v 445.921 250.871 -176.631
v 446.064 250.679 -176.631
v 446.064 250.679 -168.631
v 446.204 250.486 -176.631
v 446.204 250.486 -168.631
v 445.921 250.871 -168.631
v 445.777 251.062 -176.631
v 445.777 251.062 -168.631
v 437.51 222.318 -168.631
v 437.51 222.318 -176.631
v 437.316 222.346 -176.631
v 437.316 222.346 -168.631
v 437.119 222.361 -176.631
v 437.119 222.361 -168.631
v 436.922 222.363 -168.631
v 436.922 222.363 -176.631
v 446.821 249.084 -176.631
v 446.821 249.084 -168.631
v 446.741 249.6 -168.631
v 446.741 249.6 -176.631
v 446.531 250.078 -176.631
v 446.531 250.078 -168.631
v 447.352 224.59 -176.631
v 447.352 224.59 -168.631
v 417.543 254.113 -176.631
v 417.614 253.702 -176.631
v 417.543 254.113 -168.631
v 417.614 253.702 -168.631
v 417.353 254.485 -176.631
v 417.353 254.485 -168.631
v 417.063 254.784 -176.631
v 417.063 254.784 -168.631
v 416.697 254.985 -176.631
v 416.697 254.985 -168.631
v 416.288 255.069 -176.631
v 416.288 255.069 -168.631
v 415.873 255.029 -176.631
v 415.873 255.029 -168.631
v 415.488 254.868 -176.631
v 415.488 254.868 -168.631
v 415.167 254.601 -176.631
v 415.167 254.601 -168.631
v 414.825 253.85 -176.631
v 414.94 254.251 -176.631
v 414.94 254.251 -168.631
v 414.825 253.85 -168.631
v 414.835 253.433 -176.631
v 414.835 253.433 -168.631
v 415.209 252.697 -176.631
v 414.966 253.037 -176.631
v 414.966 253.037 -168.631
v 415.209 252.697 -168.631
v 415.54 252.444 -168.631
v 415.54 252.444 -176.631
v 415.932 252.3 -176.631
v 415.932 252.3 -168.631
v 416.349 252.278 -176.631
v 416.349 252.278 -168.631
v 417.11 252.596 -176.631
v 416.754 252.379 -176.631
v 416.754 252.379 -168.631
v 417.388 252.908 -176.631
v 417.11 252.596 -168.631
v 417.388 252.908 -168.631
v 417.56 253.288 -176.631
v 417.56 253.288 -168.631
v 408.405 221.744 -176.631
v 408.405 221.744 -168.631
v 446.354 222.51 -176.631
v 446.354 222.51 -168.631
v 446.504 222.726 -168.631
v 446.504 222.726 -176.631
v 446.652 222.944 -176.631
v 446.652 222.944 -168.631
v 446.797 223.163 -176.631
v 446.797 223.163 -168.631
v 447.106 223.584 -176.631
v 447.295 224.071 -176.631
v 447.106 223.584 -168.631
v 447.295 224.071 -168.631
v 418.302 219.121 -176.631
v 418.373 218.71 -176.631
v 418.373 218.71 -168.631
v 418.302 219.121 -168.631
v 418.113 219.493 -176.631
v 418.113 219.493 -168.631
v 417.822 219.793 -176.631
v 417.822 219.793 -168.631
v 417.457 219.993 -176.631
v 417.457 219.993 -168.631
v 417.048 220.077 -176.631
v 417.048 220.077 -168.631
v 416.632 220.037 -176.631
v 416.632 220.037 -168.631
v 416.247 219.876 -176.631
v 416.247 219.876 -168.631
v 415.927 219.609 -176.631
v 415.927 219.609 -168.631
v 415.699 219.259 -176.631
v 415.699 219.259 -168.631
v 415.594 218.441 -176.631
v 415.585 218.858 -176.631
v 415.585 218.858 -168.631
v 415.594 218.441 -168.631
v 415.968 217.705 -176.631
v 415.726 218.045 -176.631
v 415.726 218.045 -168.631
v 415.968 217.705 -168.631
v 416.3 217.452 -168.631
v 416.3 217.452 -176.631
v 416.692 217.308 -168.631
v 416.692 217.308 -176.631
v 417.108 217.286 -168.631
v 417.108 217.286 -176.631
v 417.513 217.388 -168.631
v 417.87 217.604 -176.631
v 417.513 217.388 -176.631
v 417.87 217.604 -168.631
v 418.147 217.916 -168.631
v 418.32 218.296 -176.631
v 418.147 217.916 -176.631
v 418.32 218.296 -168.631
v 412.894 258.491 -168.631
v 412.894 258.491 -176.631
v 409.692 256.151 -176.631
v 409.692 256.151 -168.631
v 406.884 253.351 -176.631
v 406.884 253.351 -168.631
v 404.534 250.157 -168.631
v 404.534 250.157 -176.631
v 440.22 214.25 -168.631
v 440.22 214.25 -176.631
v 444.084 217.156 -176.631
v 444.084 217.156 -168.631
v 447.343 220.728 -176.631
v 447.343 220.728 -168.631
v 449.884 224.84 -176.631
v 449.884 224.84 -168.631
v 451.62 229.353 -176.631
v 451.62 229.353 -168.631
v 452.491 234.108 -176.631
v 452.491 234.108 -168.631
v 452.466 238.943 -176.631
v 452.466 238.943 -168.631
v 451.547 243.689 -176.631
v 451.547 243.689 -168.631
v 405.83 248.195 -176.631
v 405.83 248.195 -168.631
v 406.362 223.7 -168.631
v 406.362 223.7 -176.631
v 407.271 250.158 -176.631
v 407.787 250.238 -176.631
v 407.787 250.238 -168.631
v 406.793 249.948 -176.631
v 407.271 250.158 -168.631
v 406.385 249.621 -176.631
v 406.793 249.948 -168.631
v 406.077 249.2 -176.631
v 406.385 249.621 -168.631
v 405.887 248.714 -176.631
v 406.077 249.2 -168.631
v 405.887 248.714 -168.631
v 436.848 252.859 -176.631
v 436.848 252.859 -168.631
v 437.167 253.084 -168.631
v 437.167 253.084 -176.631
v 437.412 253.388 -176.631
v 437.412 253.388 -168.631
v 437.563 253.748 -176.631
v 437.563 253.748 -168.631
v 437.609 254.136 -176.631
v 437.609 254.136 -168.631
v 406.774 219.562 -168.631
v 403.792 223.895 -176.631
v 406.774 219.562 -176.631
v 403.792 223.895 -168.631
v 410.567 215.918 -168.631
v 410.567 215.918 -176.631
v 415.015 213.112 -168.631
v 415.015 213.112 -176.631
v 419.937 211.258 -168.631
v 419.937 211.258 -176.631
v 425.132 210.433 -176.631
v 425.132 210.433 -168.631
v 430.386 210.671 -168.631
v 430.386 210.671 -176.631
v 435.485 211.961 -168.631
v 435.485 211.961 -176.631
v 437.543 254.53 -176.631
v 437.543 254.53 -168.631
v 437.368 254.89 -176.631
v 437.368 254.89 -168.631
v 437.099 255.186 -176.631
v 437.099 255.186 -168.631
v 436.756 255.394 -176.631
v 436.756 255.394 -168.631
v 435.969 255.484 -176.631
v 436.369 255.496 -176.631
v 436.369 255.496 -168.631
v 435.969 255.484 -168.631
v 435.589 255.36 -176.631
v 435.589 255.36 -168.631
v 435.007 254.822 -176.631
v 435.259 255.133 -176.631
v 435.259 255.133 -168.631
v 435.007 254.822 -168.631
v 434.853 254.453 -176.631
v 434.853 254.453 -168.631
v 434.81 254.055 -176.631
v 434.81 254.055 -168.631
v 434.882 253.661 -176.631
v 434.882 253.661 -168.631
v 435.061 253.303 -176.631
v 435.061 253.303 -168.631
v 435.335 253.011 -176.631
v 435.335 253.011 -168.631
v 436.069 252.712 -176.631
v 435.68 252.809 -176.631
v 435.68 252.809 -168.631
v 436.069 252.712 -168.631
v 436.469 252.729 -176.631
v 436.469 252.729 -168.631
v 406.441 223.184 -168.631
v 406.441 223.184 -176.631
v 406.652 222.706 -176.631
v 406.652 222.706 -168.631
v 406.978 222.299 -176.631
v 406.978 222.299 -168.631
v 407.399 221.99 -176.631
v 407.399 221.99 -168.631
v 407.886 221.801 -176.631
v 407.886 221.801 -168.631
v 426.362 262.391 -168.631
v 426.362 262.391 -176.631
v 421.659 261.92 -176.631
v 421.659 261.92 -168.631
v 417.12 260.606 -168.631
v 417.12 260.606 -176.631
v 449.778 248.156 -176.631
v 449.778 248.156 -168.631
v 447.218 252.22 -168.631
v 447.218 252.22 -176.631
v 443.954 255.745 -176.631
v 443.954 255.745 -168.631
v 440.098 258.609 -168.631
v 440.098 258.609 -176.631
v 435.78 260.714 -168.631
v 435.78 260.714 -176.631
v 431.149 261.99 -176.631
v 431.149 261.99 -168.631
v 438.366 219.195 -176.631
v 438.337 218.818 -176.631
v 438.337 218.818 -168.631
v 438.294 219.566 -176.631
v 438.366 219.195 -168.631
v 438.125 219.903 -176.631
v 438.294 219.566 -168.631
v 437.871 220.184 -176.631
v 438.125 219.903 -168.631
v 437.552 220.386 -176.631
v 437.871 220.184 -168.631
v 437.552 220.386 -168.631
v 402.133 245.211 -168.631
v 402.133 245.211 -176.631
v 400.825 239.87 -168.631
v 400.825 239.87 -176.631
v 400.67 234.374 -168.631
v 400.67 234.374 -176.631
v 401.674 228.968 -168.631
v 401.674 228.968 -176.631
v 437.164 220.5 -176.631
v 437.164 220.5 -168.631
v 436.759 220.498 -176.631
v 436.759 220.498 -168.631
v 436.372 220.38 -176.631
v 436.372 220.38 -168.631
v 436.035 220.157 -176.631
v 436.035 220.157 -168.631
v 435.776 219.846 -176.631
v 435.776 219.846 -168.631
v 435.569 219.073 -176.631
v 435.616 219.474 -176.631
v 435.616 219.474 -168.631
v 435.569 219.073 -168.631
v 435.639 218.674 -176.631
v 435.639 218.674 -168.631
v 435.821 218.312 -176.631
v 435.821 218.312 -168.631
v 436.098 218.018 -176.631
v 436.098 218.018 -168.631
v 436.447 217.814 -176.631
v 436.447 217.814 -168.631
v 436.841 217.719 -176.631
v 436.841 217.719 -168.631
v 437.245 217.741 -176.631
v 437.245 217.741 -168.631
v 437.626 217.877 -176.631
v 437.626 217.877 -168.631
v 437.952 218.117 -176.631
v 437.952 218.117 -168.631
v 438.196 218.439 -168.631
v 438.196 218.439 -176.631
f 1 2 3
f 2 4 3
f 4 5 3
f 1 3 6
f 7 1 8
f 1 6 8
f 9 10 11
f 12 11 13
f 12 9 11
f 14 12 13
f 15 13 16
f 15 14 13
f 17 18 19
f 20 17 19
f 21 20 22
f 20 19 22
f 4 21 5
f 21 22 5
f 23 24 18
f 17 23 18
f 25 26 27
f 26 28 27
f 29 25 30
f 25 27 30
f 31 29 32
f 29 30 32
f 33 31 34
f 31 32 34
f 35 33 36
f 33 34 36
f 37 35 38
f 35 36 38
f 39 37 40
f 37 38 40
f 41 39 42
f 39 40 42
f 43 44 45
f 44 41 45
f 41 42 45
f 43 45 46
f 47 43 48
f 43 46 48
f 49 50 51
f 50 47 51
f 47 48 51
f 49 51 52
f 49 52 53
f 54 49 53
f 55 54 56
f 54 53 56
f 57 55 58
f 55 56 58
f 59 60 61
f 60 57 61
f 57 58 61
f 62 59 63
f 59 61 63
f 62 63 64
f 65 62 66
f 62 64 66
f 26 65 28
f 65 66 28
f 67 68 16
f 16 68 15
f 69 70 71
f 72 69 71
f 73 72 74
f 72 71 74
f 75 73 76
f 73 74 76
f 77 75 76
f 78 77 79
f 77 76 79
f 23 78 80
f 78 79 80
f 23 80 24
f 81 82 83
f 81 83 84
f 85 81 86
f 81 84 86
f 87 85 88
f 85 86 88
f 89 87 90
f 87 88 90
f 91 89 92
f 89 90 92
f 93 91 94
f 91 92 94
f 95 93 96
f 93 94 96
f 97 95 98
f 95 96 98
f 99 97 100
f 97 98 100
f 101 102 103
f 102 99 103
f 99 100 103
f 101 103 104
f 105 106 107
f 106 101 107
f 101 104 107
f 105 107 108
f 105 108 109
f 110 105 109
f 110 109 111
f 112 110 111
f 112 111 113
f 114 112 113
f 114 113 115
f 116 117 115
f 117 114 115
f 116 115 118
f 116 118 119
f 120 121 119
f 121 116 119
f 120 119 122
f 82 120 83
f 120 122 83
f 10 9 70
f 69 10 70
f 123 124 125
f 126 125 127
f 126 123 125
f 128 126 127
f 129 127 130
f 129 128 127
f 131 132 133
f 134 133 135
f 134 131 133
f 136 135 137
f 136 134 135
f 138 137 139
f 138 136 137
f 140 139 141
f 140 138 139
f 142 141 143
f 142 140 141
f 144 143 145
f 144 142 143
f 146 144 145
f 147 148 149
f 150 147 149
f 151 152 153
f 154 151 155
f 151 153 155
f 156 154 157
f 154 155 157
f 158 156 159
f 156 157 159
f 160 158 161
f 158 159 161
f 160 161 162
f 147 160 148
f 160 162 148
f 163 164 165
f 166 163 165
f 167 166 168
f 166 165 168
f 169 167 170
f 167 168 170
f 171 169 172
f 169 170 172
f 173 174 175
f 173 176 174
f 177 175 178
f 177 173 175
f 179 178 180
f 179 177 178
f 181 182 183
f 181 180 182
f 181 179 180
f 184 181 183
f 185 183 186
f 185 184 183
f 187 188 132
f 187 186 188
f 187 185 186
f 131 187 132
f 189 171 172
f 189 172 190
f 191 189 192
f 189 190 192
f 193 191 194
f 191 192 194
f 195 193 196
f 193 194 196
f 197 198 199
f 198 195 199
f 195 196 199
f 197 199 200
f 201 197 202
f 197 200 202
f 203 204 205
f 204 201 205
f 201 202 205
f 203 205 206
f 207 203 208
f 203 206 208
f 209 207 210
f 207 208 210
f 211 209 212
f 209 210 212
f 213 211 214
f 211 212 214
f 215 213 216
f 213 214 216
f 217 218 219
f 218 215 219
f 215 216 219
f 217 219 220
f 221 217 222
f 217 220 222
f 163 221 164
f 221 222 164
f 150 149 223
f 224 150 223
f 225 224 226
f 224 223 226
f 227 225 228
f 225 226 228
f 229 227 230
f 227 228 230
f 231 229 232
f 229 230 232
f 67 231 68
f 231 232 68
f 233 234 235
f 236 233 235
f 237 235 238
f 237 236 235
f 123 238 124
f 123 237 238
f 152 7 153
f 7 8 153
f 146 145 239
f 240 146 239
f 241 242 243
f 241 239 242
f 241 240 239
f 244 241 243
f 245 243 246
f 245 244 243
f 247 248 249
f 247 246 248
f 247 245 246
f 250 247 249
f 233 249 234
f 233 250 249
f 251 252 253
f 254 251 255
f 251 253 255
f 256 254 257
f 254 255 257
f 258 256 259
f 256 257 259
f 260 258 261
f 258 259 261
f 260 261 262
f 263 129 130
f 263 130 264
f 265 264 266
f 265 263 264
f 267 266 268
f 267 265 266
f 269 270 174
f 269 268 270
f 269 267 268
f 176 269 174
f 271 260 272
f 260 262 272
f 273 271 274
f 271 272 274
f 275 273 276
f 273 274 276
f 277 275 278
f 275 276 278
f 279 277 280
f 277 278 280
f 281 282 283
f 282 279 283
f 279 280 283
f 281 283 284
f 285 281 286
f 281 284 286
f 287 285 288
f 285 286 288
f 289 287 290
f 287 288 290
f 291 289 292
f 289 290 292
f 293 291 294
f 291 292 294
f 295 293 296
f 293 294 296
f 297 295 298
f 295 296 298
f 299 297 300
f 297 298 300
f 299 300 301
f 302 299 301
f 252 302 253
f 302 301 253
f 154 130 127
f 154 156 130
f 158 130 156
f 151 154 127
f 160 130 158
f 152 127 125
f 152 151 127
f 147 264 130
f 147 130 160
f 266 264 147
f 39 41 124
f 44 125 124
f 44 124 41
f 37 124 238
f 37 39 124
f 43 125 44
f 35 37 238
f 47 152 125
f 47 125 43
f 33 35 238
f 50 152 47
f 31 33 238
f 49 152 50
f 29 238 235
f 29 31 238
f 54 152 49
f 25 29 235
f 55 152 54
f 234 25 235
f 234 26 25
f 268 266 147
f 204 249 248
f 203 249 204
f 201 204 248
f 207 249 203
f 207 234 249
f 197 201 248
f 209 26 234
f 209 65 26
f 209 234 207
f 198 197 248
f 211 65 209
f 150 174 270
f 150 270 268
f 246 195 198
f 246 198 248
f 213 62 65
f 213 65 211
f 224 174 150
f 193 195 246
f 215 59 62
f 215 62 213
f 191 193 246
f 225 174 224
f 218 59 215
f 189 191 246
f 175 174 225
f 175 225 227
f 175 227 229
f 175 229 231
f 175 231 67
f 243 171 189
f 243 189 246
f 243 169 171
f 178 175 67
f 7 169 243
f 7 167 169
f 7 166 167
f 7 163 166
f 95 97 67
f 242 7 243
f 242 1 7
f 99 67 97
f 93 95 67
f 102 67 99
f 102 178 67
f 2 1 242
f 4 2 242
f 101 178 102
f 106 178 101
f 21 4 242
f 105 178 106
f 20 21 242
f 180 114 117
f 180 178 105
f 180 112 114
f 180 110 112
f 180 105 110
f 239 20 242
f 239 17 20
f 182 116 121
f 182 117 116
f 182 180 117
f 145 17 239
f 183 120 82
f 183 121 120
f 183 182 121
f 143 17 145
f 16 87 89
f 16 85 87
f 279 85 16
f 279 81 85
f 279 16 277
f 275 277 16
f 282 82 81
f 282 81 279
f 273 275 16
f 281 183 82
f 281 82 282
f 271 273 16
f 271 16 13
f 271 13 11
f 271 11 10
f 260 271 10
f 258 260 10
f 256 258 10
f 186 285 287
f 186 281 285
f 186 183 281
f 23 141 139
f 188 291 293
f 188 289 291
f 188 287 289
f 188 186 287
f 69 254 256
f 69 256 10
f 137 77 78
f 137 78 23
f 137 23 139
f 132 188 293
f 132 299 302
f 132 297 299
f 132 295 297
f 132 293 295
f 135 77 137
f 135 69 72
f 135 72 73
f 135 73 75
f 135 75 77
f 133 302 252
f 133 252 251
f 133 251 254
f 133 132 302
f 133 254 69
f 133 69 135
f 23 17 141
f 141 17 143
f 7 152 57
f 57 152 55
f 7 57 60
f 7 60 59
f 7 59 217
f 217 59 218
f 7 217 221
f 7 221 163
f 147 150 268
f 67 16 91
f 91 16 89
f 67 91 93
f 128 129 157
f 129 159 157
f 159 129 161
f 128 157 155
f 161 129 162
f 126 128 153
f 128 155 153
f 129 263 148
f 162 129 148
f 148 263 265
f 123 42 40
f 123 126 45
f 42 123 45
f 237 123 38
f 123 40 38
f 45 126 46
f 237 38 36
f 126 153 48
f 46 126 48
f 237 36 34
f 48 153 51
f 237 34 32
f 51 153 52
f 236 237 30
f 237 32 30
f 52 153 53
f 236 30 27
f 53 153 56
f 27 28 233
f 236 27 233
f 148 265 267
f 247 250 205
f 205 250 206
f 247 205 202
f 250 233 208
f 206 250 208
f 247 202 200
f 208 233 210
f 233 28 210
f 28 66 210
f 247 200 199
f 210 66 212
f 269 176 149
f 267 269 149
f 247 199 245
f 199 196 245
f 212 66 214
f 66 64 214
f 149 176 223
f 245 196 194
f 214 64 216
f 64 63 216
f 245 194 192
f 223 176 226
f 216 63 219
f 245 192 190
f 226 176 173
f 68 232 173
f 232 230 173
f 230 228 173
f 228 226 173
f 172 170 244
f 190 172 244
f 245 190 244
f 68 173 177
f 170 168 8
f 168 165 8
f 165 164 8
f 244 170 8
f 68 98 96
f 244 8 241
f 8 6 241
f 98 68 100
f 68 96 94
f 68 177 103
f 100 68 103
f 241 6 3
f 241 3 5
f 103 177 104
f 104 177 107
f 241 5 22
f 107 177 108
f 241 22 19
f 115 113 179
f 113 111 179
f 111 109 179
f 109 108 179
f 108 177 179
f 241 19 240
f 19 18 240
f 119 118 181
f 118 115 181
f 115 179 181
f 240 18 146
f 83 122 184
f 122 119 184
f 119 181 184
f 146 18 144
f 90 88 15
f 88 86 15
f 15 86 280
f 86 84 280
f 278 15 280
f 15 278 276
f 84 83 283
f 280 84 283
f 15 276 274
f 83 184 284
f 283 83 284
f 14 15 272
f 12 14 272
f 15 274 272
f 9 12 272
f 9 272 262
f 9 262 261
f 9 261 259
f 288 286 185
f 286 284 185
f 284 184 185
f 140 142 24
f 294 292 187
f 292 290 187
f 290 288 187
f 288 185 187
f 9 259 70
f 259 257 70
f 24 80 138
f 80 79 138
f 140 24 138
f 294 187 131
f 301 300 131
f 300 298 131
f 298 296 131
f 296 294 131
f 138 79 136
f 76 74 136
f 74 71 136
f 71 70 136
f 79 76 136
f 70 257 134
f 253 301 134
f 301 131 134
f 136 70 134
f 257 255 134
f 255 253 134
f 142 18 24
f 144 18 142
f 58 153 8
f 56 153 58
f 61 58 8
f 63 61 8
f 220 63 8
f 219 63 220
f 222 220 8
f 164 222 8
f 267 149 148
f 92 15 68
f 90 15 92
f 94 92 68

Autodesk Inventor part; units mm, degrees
ref_plane "YZ Plane" through (0, 0, 0) normal (1, 0, 0) x (0, 1, 0)
ref_plane "XZ Plane" through (0, 0, 0) normal (0, 1, 0) x (-1, 0, 0)
ref_plane "XY Plane" through (0, 0, 0) normal (0, 0, 1) x (1, 0, 0)
ref_plane "Arbeitsebene1" through (426.5914, 236.3923, -168.6308) normal (0, 0, -1) x (0.9998, 0.0217, 0)
sketch "Skizze1" plane through (426.5914, 236.3923, -168.6308) normal (0, 0, -1) x (0.9998, 0.0217, 0)
  circle A0 centre (-10, -17.5) radius 1.4 projected
  arc A1 (-22.2323, -12) -> (-21.7536, -14.2401) centre (-19.0971, -12.5012) ccw projected
  arc A2 (-21.7536, -14.2401) -> (-13.215, -22.3912) centre (0, 0) ccw projected
  arc A3 (-13.215, -22.3912) -> (-8.8966, -21.32) centre (-11.6012, -19.6569) ccw projected
  arc A4 (-2.8797, -22.9216) -> (-8.8966, -21.32) centre (-6.1282, -23.0224) ccw projected
  arc A5 (-2.8797, -22.9216) -> (0.3346, -25.9978) centre (0.2937, -22.8231) ccw projected
  arc A6 (0.3346, -25.9978) -> (25.1076, -6.7536) centre (0, 0) ccw projected
  arc A7 (25.1076, -6.7536) -> (24.1419, -5.4938) centre (24.1419, -6.4938) ccw projected
  line L0 (24.1419, -5.4938) -> (21.5, -5.4938) projected
  arc A8 (21.5, -5.4938) -> (20.5, -6.4938) centre (21.5, -6.4938) ccw projected
  line L1 (20.5, -6.4938) -> (20.5, -12.25) projected
  arc A9 (19.5653, -13.9427) -> (20.5, -12.25) centre (18.5, -12.25) ccw projected
  arc A10 (19.5653, -13.9427) -> (18.3317, -15.4908) centre (21.1633, -16.4816) ccw projected
  arc A11 (15.5, -17.5) -> (18.3317, -15.4908) centre (15.5, -14.5) ccw projected
  line L2 (15.5, -17.5) -> (11.4, -17.5) projected
  arc A12 (10.611, -16.2403) -> (11.4, -17.5) centre (10, -17.5) ccw projected
  line L3 (10.611, -16.2403) -> (10.611, -14.3079) projected
  arc A13 (10.611, -14.3079) -> (10.0242, -14.25) centre (10.0242, -17.25) ccw projected
  line L4 (10.0242, -14.25) -> (-18.5, -14.25) projected
  arc A14 (-20.5, -12.25) -> (-18.5, -14.25) centre (-18.5, -12.25) ccw projected
  line L5 (-20.5, -12.25) -> (-20.5, -12) projected
  line L6 (-22.2323, -12) -> (-20.5, -12) projected
  arc A15 (14.1536, 17.8908) -> (13.1449, 22.4324) centre (11.5397, 19.693) ccw projected
  arc A16 (13.1449, 22.4324) -> (-23.0651, 12) centre (0, 0) ccw projected
  line L7 (-20.5, 12) -> (-23.0651, 12) projected
  line L8 (-20.5, 12) -> (-20.5, 12.25) projected
  arc A17 (-18.5, 14.25) -> (-20.5, 12.25) centre (-18.5, 12.25) ccw projected
  line L9 (-18.5, 14.25) -> (10.0242, 14.25) projected
  arc A18 (10.0242, 14.25) -> (10.611, 14.3079) centre (10.0242, 17.25) ccw projected
  line L10 (10.611, 14.3079) -> (10.611, 16.2403) projected
  arc A19 (11.3618, 17.8248) -> (10.611, 16.2403) centre (10, 17.5) ccw projected
  line L11 (11.3618, 17.8248) -> (14.1093, 17.8248) projected
  arc A20 (14.1536, 17.8908) -> (14.1093, 17.8248) centre (16.8293, 16.046) ccw projected
  circle A21 centre (-10, 17.5) radius 1.4 projected
  circle A22 centre (10, 17.5) radius 1.4
  circle A23 centre (10, -17.5) radius 1.4
  circle A24 centre (0, 0) radius 26
  circle A25 centre (0, 0) radius 24.1513
  line L12 (-20.5, -12) -> (-20.5, 12)
  arc A26 (23.033, 12.0616) -> (19.834, 13.7401) centre (20.2203, 10.5887) ccw projected
  arc A27 (20.5, 12.25) -> (19.834, 13.7401) centre (18.5, 12.25) ccw projected
  line L13 (20.5, 12.25) -> (20.5, 7.4938) projected
  arc A28 (20.5, 7.4938) -> (21.5, 6.4938) centre (21.5, 7.4938) ccw projected
  line L14 (21.5, 6.4938) -> (23.8504, 6.4938) projected
  arc A29 (23.8504, 6.4938) -> (24.8044, 7.7936) centre (23.8504, 7.4938) ccw projected
  arc A30 (24.8044, 7.7936) -> (23.033, 12.0616) centre (0, 0) ccw projected
  line L15 (20.5, -6.4938) -> (20.5, 7.4938)
  line L16 (10.611, 14.3079) -> (19.4569, 14.3079)
  line L17 (10.0242, -14.25) -> (19.4993, -14.25)
  point P0 (-431.6269, 227.0676)
  point P1 (14.6734, 19.1827)
  point P2 (19.9142, 13.6642)
  point P3 (19.9142, -13.6642)
  point P4 (18.1109, -15.9775)
  point P5 (13.1449, 22.4324)
  point P6 (-21.7536, -14.2401)
  point P7 (-13.215, -22.3912)
  point P8 (0.3346, -25.9978)
  point P9 (25.1076, -6.7536)
  point P10 (11.4, -17.5)
extrude "Extrusion1" add sketch "Skizze1" along normal blind 8 contours L6 A25 A14 A3 A2 A1 | A1 A24 L7 A25 L6 | A25 L7 L12 L6 | L6 L5 A14 A25 | A3 A25 A5 A24 | A16 A15 A25 A17 L7 | L17 A10 A11 A25 L2 A23 L3 A13 | A25 A17 L8 L7 | A25 A14 L4 A13 L3 A12 L2 A11 A5 A4 A3 | A3 A4 A5 A25 | A5 A25 A11 A9 L0 A7 A6 | A24 A26 A25 A15 | A7 L0 A25 L14 A29 A24 | A25 L16 L10 A22 L11 A20 A15 | A15 A20 L11 A19 L10 A18 L9 A17 A25 | A24 A29 L14 A25 A27 A26 | A25 A11 | A11 A10 L17 A25 | A25 A9 L1 A8 L0 | L0 A8 L15 A28 L14 A25 | L14 A28 L13 A27 A25
properties part number "Anglerfish_spacer8mm_bottom_v0"
